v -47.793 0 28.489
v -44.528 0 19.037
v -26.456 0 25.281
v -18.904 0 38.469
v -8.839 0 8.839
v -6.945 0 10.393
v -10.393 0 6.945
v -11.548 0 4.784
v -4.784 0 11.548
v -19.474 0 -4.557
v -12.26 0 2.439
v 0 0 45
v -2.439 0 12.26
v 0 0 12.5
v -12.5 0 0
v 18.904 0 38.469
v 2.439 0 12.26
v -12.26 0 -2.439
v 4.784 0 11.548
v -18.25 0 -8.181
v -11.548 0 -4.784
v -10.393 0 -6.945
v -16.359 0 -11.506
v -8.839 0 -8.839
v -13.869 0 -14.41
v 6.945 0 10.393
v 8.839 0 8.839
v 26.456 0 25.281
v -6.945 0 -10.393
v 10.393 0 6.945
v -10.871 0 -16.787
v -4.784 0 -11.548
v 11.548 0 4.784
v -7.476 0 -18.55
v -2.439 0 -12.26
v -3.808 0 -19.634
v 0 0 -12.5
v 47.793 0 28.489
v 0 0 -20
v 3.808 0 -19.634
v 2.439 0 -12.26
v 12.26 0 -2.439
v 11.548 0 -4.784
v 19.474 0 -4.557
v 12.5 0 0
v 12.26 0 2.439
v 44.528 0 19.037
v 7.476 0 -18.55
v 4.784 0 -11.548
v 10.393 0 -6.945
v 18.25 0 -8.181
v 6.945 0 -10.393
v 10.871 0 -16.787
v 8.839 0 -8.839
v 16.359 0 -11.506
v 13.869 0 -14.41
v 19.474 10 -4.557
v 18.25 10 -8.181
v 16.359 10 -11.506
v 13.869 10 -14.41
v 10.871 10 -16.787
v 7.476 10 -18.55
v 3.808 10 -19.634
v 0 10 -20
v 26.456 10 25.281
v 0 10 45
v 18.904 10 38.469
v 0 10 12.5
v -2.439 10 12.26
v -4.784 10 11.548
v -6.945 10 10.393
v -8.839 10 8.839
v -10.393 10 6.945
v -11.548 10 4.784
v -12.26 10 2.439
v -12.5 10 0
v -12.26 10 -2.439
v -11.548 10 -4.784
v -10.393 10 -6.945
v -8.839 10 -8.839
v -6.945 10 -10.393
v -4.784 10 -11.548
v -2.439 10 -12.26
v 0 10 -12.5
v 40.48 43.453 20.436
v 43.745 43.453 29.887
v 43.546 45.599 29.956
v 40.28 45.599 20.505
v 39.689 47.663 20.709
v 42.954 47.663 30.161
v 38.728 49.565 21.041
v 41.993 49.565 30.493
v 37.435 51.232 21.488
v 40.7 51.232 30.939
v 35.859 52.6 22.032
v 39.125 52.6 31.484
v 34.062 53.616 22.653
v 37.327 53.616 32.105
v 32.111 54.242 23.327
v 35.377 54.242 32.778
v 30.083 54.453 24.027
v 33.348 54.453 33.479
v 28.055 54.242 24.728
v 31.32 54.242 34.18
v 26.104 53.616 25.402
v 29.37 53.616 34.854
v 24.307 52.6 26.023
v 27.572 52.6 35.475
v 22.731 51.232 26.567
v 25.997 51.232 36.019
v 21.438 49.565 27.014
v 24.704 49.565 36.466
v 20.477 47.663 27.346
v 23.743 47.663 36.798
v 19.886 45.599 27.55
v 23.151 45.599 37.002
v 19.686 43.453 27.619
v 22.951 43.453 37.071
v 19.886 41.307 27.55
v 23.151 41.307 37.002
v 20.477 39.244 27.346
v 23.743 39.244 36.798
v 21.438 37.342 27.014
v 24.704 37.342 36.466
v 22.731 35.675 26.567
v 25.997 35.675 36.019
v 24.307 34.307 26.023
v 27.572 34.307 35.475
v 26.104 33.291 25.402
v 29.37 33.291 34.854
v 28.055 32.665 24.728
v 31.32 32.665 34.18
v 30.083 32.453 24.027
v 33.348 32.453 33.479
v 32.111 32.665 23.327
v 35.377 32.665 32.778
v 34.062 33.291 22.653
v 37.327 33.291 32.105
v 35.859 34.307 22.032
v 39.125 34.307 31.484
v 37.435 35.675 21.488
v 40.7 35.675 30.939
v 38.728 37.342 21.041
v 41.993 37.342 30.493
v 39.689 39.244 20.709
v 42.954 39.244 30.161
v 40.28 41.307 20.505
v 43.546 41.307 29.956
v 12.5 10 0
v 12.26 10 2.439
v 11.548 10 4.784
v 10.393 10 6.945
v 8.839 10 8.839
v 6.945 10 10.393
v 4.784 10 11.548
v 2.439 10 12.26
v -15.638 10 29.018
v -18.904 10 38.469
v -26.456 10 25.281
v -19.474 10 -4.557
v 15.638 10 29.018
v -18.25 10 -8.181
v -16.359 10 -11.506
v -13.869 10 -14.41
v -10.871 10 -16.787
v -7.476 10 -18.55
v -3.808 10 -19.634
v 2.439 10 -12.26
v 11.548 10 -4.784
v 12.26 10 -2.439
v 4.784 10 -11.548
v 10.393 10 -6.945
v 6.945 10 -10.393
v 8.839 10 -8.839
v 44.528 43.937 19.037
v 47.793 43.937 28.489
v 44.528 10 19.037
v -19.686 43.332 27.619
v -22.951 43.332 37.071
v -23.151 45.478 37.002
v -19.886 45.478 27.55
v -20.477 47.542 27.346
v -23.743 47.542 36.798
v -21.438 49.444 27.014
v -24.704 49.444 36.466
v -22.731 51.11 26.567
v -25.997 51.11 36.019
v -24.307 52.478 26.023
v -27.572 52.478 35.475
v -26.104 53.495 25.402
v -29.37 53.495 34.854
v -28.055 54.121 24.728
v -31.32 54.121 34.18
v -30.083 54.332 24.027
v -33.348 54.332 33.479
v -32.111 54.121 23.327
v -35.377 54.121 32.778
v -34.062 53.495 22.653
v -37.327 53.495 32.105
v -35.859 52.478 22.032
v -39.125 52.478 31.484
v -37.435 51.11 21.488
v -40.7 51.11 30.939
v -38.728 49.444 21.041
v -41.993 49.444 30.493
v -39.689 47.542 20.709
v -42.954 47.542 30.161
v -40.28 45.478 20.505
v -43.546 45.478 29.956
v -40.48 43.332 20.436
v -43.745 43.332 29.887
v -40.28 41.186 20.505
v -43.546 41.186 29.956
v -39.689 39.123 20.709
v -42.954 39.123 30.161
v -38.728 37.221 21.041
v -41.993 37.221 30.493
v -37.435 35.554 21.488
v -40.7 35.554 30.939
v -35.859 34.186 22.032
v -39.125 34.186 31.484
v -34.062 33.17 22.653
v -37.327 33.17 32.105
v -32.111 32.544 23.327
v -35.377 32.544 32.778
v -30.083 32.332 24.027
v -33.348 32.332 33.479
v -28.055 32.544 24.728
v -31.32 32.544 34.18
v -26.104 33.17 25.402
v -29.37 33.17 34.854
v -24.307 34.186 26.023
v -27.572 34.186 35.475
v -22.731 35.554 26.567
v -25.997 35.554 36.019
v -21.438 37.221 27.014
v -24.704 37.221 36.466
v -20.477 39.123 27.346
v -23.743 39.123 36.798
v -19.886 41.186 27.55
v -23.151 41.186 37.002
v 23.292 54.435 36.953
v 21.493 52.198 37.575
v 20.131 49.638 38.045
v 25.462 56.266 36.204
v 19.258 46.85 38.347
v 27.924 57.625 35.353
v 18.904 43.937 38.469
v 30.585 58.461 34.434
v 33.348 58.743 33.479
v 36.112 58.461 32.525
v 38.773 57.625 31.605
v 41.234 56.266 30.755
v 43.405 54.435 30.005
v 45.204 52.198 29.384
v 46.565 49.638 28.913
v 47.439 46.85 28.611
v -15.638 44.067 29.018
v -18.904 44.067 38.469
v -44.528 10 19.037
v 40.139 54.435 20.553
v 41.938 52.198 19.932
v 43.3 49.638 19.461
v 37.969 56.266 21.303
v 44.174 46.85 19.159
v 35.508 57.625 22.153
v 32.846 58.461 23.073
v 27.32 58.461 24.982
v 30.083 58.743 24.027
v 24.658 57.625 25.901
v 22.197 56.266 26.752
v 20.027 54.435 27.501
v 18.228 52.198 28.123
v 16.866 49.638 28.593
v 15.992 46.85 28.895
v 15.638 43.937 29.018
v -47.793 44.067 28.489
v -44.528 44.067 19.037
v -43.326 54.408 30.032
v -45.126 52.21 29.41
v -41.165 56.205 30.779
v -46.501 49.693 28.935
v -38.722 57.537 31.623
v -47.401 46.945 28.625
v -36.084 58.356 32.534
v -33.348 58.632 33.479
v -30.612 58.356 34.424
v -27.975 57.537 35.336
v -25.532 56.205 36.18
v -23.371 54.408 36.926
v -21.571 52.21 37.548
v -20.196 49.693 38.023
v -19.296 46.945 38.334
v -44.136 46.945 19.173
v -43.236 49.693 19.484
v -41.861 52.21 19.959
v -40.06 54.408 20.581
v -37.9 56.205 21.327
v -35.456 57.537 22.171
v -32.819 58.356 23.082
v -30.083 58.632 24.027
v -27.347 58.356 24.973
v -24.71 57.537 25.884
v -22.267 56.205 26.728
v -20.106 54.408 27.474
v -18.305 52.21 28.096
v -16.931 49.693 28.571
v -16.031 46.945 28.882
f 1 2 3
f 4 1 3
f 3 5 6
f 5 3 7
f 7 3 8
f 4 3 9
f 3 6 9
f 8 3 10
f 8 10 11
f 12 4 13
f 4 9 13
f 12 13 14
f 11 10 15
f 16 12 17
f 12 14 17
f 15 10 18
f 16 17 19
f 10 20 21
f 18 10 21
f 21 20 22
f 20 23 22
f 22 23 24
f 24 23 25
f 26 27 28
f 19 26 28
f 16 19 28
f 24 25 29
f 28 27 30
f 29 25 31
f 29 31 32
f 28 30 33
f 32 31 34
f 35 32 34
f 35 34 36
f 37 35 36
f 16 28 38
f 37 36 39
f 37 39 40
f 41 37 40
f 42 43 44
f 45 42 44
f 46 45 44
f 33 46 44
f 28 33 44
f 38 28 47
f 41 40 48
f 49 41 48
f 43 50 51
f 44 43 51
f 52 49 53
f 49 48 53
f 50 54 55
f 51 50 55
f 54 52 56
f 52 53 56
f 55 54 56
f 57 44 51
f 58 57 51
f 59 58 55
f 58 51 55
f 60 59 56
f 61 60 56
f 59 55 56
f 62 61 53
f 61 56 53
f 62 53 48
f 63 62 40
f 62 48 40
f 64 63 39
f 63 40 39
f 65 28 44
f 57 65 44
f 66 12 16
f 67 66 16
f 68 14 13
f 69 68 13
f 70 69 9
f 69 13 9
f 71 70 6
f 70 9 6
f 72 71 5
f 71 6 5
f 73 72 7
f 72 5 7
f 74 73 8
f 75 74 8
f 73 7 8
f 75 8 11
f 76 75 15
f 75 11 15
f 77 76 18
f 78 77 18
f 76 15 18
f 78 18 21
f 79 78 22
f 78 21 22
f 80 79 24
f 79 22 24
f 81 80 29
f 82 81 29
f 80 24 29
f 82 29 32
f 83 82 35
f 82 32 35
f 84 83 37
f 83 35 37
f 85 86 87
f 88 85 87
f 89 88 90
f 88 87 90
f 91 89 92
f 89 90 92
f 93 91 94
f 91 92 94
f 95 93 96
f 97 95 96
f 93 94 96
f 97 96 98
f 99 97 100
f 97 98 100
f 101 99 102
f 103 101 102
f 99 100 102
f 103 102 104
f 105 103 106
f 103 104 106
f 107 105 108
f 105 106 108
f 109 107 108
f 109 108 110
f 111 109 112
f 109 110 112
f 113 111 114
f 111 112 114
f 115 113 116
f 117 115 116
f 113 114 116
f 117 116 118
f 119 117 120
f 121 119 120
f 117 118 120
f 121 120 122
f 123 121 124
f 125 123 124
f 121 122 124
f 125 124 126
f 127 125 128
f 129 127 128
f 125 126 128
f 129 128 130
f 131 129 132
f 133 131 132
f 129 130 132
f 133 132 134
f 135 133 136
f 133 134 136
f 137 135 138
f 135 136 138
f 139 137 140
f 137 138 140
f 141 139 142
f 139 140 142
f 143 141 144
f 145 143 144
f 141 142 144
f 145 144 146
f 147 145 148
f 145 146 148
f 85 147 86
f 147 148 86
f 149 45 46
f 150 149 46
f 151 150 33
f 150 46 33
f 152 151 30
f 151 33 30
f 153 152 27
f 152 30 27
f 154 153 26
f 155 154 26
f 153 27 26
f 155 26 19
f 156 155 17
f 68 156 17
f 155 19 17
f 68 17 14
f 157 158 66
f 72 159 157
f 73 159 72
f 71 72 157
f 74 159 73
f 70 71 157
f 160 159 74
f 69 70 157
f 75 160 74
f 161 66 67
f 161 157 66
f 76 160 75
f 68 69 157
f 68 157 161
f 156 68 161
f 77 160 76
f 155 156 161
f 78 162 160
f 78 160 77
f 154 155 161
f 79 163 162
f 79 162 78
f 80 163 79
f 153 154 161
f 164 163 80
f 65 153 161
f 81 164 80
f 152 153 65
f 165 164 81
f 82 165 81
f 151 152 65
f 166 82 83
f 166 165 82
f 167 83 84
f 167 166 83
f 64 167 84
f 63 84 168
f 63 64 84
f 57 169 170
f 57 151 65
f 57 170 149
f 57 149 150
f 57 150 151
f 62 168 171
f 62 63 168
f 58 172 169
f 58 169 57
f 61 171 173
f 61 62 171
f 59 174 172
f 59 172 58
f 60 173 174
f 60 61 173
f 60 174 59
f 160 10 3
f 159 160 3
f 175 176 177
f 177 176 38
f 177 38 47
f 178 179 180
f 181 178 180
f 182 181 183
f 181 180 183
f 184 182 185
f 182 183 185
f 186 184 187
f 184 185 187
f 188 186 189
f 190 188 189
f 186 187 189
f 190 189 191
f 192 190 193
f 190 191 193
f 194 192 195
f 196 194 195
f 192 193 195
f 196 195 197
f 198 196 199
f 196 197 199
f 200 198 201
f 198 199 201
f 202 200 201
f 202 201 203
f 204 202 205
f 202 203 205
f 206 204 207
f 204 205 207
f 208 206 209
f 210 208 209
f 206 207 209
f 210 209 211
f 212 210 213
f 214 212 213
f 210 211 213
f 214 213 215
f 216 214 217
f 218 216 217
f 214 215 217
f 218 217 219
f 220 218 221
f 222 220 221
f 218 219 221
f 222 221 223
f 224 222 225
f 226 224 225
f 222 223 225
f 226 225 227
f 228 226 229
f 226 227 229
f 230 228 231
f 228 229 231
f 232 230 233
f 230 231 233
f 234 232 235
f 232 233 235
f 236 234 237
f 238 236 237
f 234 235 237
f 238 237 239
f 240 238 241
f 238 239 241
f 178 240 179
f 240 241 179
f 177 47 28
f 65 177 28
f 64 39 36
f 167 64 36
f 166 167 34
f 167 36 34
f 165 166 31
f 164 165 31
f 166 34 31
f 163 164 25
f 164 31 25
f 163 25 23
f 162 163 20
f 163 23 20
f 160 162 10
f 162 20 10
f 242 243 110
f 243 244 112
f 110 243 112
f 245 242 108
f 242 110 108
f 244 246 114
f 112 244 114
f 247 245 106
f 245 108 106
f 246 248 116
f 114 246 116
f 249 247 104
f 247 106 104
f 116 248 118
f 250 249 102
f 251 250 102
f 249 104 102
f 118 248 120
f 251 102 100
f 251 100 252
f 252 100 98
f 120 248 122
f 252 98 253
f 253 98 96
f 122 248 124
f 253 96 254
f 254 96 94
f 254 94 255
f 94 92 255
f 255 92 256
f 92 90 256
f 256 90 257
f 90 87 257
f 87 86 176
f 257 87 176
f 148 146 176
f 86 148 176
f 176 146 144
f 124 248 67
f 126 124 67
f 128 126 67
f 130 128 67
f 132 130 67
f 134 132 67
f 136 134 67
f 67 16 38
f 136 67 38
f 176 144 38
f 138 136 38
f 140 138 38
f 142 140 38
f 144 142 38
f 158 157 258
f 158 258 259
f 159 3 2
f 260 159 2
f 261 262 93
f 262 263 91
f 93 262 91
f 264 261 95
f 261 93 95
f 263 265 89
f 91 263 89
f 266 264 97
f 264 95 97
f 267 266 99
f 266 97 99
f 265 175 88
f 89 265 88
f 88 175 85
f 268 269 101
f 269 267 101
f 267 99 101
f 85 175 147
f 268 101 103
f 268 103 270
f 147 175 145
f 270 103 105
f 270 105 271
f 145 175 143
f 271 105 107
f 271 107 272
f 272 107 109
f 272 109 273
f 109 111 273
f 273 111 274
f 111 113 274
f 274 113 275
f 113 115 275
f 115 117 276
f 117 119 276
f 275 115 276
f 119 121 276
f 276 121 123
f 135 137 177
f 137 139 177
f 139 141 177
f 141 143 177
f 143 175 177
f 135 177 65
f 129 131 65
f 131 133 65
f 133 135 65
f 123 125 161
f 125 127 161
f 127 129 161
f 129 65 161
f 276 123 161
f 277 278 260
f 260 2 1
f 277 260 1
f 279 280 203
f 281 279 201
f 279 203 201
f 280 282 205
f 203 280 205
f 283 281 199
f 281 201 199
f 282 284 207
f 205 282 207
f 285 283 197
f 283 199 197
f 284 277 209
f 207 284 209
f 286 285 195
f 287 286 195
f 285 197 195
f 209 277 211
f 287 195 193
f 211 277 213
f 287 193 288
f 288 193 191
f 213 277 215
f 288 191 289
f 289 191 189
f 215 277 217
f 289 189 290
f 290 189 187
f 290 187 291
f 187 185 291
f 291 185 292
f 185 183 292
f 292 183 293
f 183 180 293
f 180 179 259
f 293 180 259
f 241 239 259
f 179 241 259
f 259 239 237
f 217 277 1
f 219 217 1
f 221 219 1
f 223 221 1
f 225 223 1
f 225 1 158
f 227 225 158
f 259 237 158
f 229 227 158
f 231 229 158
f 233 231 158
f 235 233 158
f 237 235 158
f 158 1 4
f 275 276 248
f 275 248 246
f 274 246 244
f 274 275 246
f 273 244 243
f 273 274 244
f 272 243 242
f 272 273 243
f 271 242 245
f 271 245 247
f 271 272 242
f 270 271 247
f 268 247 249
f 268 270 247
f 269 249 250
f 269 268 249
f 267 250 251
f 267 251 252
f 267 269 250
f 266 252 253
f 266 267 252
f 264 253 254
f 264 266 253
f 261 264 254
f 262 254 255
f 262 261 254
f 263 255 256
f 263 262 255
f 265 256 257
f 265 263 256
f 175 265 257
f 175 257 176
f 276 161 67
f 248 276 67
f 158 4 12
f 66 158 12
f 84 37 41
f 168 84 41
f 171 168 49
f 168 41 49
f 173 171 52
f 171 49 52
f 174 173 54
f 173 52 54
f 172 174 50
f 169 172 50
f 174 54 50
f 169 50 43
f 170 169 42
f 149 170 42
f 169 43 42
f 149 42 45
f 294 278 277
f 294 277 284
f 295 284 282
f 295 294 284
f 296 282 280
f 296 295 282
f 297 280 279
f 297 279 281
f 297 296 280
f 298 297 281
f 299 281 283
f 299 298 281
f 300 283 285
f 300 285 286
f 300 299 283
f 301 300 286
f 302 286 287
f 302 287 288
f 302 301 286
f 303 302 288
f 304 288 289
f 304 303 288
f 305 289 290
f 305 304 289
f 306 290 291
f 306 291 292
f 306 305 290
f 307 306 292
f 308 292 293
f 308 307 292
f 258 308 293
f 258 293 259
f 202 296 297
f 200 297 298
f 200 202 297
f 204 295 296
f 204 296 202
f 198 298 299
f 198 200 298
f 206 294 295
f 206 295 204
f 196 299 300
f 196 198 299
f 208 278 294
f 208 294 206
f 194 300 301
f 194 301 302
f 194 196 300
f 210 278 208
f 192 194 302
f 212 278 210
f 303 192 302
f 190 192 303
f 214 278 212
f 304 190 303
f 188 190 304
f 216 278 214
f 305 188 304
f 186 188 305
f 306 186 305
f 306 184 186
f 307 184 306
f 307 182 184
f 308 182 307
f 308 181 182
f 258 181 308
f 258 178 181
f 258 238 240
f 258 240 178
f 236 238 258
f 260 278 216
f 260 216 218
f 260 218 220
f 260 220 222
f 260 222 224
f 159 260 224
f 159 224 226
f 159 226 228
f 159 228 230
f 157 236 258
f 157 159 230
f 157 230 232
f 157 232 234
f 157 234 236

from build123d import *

# Parameters (mm, degrees)
BOSS_EXTRUDE1_DEPTH = 10
BOSS_EXTRUDE3_DEPTH = 50
CUT_EXTRUDE2_START  = -10
CUT_EXTRUDE2_DEPTH  = 10
CUT_EXTRUDE3_START  = -10
CUT_EXTRUDE3_DEPTH  = 10
SKETCH9_R           = 11
CUT_EXTRUDE4_DEPTH  = 10
SKETCH10_R          = 11
CUT_EXTRUDE5_DEPTH  = 10


# Read off the part's stored shape, not the designer's step: Cut-Extrude2, Cut-Extrude3
with BuildPart() as part:
    # Sketch2 → Boss-Extrude1 (new body)
    with BuildSketch(Plane(origin=(0, 0, 0), x_dir=(1, 0, 0), z_dir=(0, 1, 0))):
        with BuildLine():
            ThreePointArc((0, 20), (-12.427112426, 15.670573594), (-19.473997983, 4.556687675))
            Line((-19.473997983, 4.556687675), (-26.455560952, -25.280543414))
            Line((-26.455560952, -25.280543414), (-15.63841821, -29.017513463))
            Line((-15.63841821, -29.017513463), (-18.903729183, -38.469378055))
            Line((-18.903729183, -38.469378055), (0, -45))
            Line((0, -45), (0, -12.5))
            ThreePointArc((0, -12.5), (-12.5, 0), (0, 12.5))
            Line((0, 12.5), (0, 20))
        make_face()
        with BuildLine():
            ThreePointArc((19.473997983, 4.556687675), (12.427112426, 15.670573594), (0, 20))
            Line((0, 20), (0, 12.5))
            ThreePointArc((0, 12.5), (8.838834765, 8.838834765), (12.5, 0))
            ThreePointArc((12.5, 0), (8.838834765, -8.838834765), (0, -12.5))
            Line((0, -12.5), (0, -45))
            Line((0, -45), (18.903729183, -38.469378055))
            Line((18.903729183, -38.469378055), (15.63841821, -29.017513463))
            Line((15.63841821, -29.017513463), (26.455560952, -25.280543414))
            Line((26.455560952, -25.280543414), (19.473997983, 4.556687675))
        make_face()
        Polygon((44.52777222, -19.037183791), (26.455560952, -25.280543414), (15.63841821, -29.017513463), (18.903729183, -38.469378055), (47.793083193, -28.489048382), align=None)
        Polygon((-15.63841821, -29.017513463), (-26.455560952, -25.280543414), (-44.52777222, -19.037183791), (-47.793083193, -28.489048382), (-18.903729183, -38.469378055), align=None)
    extrude(amount=BOSS_EXTRUDE1_DEPTH)

    # Sketch6 → Boss-Extrude3 (add)
    with BuildSketch(Plane(origin=(0, 10, 0), x_dir=(1, 0, 0), z_dir=(0, 1, 0))):
        Polygon((47.793083193, -28.489048382), (44.52777222, -19.037183791), (15.63841821, -29.017513463), (18.903729183, -38.469378055), align=None)
        Polygon((-47.793083193, -28.489048382), (-44.52777222, -19.037183791), (-15.63841821, -29.017513463), (-18.903729183, -38.469378055), align=None)
    extrude(amount=BOSS_EXTRUDE3_DEPTH)

    # Cut-Extrude2 outline → Cut-Extrude2 (cut)
    with BuildSketch(Plane(origin=(-13.888474723, 0, 40.201984913), x_dir=(0.9451864591285483, 0, 0.32653109726339585), z_dir=(-0.3265310972633958, 0, 0.9451864591285482)).offset(CUT_EXTRUDE2_START)):
        with BuildLine():
            ThreePointArc((-35.870814845, 44.066794658), (-20.588457734, 58.63224641), (-5.306100623, 44.066794658))
            Line((-5.306100623, 44.066794658), (-5.306100623, 60))
            Line((-5.306100623, 60), (-35.870814845, 60))
            Line((-35.870814845, 60), (-35.870814845, 44.066794658))
        make_face()
    extrude(amount=CUT_EXTRUDE2_DEPTH, mode=Mode.SUBTRACT)

    # Cut-Extrude3 outline → Cut-Extrude3 (cut)
    with BuildSketch(Plane(origin=(13.888474723, 0, 40.201984913), x_dir=(0.9451864591285483, 0, -0.3265310972633959), z_dir=(0.3265310972633959, 0, 0.9451864591285483)).offset(CUT_EXTRUDE3_START)):
        with BuildLine():
            ThreePointArc((5.306100623, 43.936741919), (20.588457734, 58.743356846), (35.870814845, 43.936741919))
            Line((35.870814845, 43.936741919), (35.870814845, 60))
            Line((35.870814845, 60), (5.306100623, 60))
            Line((5.306100623, 60), (5.306100623, 43.936741919))
        make_face()
    extrude(amount=CUT_EXTRUDE3_DEPTH, mode=Mode.SUBTRACT)

    # Sketch9 → Cut-Extrude4 (cut)
    with BuildSketch(Plane(origin=(-13.888474723, 0, 40.201984913), x_dir=(0.9451864591285483, 0, 0.32653109726339585), z_dir=(-0.3265310972633958, 0, 0.9451864591285482))):
        with Locations((-20.588457734, 43.33224641)):
            Circle(SKETCH9_R)
    extrude(amount=-CUT_EXTRUDE4_DEPTH, mode=Mode.SUBTRACT)

    # Sketch10 → Cut-Extrude5 (cut)
    with BuildSketch(Plane(origin=(13.888474723, 0, 40.201984913), x_dir=(0.9451864591285483, 0, -0.3265310972633959), z_dir=(0.3265310972633959, 0, 0.9451864591285483))):
        with Locations((20.588457734, 43.453356846)):
            Circle(SKETCH10_R)
    extrude(amount=-CUT_EXTRUDE5_DEPTH, mode=Mode.SUBTRACT)


solid = part.part
